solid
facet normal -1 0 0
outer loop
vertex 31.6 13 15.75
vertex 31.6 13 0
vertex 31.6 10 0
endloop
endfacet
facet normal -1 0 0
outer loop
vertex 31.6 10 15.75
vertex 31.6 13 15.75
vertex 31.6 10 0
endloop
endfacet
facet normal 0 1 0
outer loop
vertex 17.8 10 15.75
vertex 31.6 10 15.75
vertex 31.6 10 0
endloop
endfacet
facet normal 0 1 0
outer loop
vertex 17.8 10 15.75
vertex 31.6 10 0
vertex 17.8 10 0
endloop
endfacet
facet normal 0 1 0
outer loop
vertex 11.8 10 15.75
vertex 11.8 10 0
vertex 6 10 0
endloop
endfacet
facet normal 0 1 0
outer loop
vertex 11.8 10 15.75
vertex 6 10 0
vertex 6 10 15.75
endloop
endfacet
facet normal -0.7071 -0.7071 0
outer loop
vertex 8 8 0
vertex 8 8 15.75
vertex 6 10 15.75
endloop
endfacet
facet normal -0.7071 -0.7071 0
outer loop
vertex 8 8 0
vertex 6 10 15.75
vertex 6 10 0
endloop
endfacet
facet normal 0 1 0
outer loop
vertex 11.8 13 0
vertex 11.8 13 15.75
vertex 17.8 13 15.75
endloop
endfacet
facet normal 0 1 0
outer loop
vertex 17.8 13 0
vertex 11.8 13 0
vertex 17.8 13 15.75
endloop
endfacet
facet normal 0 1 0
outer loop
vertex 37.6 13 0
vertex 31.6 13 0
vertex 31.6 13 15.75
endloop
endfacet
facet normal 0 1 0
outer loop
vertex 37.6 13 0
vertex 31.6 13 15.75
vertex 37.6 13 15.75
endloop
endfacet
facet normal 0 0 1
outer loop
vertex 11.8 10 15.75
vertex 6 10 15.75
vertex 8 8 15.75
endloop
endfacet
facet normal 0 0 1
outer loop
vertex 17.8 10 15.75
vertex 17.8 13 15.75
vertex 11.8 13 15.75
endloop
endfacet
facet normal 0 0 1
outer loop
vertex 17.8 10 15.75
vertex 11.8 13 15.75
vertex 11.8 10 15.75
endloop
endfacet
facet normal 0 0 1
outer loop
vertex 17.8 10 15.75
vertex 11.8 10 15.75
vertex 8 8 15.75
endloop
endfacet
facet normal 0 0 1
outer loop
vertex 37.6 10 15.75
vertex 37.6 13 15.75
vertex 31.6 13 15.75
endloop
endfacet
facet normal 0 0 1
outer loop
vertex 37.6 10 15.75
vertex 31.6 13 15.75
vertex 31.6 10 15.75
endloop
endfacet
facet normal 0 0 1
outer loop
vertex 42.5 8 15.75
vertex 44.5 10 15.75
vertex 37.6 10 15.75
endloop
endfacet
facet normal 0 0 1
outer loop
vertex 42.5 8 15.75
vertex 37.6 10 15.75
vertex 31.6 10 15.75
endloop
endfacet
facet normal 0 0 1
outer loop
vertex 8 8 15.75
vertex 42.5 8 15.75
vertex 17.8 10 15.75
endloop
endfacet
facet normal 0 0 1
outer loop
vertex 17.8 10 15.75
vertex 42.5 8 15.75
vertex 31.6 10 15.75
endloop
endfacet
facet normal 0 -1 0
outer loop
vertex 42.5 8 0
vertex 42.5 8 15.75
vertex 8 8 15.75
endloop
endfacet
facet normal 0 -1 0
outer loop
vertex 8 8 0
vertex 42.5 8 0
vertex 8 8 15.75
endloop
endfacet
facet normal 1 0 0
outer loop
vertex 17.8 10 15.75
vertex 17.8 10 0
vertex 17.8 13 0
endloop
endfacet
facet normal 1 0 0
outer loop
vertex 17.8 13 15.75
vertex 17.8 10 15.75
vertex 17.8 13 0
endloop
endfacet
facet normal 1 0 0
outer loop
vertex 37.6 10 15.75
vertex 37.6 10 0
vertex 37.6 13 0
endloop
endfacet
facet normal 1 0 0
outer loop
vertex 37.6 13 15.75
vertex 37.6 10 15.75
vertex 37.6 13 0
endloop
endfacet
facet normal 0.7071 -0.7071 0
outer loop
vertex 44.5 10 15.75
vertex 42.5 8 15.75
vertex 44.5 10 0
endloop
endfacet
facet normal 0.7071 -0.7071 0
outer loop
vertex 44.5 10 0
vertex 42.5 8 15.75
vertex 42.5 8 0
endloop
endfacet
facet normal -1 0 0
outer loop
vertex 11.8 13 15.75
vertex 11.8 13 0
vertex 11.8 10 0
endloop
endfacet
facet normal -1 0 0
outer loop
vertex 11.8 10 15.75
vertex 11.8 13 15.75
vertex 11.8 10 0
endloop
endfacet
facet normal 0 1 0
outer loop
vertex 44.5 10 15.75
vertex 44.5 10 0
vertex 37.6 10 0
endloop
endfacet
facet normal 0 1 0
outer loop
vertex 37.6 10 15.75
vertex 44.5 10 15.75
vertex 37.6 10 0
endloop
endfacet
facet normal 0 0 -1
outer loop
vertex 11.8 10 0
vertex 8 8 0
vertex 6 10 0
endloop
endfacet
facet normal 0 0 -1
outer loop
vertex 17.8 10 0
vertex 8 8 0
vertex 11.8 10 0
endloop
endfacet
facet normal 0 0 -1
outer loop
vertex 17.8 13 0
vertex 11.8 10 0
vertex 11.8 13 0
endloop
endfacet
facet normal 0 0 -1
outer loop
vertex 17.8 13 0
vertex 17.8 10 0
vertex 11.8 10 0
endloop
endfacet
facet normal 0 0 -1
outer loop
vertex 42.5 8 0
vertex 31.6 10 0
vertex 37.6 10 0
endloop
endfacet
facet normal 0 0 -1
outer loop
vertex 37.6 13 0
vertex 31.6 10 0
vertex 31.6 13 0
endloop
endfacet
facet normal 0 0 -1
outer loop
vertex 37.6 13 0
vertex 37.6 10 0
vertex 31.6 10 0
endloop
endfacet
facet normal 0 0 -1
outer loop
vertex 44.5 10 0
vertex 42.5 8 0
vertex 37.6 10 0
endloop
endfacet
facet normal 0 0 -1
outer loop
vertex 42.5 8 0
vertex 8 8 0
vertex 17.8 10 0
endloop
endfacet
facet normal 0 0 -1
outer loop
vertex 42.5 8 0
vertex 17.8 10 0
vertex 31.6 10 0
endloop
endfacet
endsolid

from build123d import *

# Parameters (mm, degrees)
F1_DEPTH  = 15.75
F3_D      = 4
F4_DEPTH  = 3
F5_W      = 3
F5_H      = 15.75
F6_DEPTH  = 25
F8_D      = 2
F9_W      = 6
F9_H      = 4
F10_DEPTH = 15.751
F11_SIZE  = 1
F12_SIZE  = 5
F13_DEPTH = 1
F14_DEPTH = 1
F15_W     = 0.1029567271
F15_H     = 11.4527670667
F15_W_2   = 37.000869453
F16_DEPTH = 15.751
F17_SIZE  = 1.99999


# Not quite as in the source:
# - a fillet or chamfer is up to 0.001 mm smaller than in the source, because OpenCascade refuses the exact size


with BuildPart() as f1:
    # F0 (on Top) → F1 (new body)
    with BuildSketch(Plane.XY):
        Polygon((0, 0), (44.5, 0), (44.5, 10), (37.6, 10), (37.6, 16), (31.6, 16), (31.6, 10), (17.8, 10), (17.8, 16), (11.8, 16), (11.8, 10), (0, 10), align=None)
    extrude(amount=F1_DEPTH)

    # F3 (through all)
    with Locations(Plane.XY.offset(15.75)):
        with Locations((24.7, 5)):
            Hole(F3_D / 2)

    # F4 (add): a face of the model
    f4_faces = [f1.faces().sort_by_distance(p)[0] for p in [
        (0, 5, 7.875),
    ]]
    extrude(f4_faces, amount=F4_DEPTH)

    # F5 (on face) → F6 (join)
    with BuildSketch(Plane(origin=(0, 10, 0), x_dir=(-1, 0, 0), z_dir=(0, 1, 0))):
        with Locations((1.5, 7.875)):
            Rectangle(F5_W, F5_H)
    extrude(amount=F6_DEPTH)

    # F8 (through all)
    with Locations(Plane.YZ):
        with Locations((27.25, 7.875), (17.75, 7.875)):
            Hole(F8_D / 2)

    # F9 (on face) → F10 (cut, through all)
    with BuildSketch(Plane.XY.offset(15.75)):
        with Locations((3, 8)):
            Rectangle(F9_W, F9_H)
    extrude(amount=-F10_DEPTH, mode=Mode.SUBTRACT)

    # F11
    f11_edges = [f1.edges().sort_by_distance(p)[0] for p in [
        (11.8, 16, 7.875),
        (17.8, 16, 7.875),
        (31.6, 16, 7.875),
        (37.6, 16, 7.875),
    ]]
    chamfer(f11_edges, length=F11_SIZE)

    # F12
    f12_edges = [f1.edges().sort_by_distance(p)[0] for p in [
        (44.5, 0, 7.875),
    ]]
    chamfer(f12_edges, length=F12_SIZE)

    # F13 (add): a face of the model
    f13_faces = [f1.faces().sort_by_distance(p)[0] for p in [
        (-3, 0.3838049635, 7.875),
    ]]
    extrude(f13_faces, amount=F13_DEPTH)

    # F14 (cut): a face of the model
    f14_faces = [f1.faces().sort_by_distance(p)[0] for p in [
        (0, 20.4721036707, 7.875),
    ]]
    extrude(f14_faces, amount=-F14_DEPTH, mode=Mode.SUBTRACT)

    # F15 (on face) → F16 (cut, through all)
    with BuildSketch(Plane.XY.offset(15.75)):
        with Locations((5.9485216364, 18.7263835333)):
            Rectangle(F15_W, F15_H)
        Polygon((6, 13), (5.8970432729, 13), (5.8970432729, 24.4527670667), (6, 24.4527670667), (6, 35.557191819), (-12.8509793431, 35.557191819), (-12.8509793431, -2.8801800217), (6, -2.8801800217), (6, 8), align=None)
        with Locations((24.5004347265, 18.7263835333)):
            Rectangle(F15_W_2, F15_H)
        Polygon((49.3548065424, 8), (6, 8), (6, -2.8801800217), (6, -4.4490518048), (49.3548065424, -4.4490518048), align=None)
    extrude(amount=-F16_DEPTH, mode=Mode.SUBTRACT)

    # F17 (size 2 in the source; OpenCascade refuses exactly that, so slightly less here)
    f17_edges = [f1.edges().sort_by_distance(p)[0] for p in [
        (6, 8, 7.875),
        (44.5, 8, 7.875),
    ]]
    chamfer(f17_edges, length=F17_SIZE)


solid = f1.part
